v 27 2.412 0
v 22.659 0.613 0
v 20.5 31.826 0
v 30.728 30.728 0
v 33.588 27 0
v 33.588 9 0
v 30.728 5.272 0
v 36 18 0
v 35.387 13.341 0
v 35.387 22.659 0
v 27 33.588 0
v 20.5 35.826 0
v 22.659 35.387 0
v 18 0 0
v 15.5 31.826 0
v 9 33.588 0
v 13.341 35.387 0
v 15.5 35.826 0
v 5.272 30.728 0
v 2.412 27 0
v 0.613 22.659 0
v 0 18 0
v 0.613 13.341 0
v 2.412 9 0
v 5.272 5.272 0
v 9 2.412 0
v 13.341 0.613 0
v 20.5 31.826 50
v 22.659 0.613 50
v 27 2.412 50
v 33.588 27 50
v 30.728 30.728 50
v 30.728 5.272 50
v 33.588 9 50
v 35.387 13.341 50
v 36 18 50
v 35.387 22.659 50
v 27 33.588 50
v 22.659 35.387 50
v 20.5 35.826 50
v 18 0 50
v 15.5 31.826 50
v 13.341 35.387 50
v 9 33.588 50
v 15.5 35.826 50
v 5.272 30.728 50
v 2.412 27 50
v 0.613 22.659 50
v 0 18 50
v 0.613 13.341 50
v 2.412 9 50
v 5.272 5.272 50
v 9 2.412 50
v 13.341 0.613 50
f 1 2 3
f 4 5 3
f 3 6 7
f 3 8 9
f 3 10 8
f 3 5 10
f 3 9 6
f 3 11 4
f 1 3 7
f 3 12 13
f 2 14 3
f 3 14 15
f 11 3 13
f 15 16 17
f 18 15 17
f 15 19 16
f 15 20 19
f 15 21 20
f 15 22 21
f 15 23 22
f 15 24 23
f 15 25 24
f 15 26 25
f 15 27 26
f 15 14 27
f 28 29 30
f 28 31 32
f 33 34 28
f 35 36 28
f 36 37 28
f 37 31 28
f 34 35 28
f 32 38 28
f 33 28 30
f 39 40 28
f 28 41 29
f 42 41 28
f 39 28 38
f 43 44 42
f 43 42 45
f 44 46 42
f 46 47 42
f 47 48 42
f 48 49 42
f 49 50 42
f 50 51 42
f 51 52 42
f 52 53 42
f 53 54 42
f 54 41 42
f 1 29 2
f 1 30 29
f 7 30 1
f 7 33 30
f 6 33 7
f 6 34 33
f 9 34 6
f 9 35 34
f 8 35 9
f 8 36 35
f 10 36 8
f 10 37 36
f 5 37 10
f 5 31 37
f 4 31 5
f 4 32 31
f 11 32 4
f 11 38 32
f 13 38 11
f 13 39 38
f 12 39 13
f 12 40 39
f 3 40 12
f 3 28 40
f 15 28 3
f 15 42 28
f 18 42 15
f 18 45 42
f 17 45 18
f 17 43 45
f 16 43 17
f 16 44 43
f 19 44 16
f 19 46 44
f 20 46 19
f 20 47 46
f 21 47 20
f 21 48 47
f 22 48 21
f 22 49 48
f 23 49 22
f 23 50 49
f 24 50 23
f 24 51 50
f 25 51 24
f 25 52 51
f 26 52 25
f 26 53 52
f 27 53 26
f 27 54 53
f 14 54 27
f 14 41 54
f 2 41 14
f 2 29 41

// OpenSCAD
$fn = 32;

// ----------------------------------------------------------------------
// Keyway shaft: d36 shaft, key 5 x 4 mm
// ----------------------------------------------------------------------

// --- parameters (mm) ---
shaft_r = 18;             // shaft radius
key_w = 5;                // keyway width
key_d = 4;                // keyway depth below the surface line
plate_t = 50;             // shaft length, Z (extrusion height)

shaft_d = 2 * shaft_r;  // shaft diameter
circle_step = 15;  // polygon sampling step, degrees

profile = [[13.341, 35.387], [9, 33.588], [5.272, 30.728], [2.412, 27], [0.613, 22.659], [0, 18], [0.613, 13.341], [2.412, 9], [5.272, 5.272], [9, 2.412], [13.341, 0.613], [18, 0], [22.659, 0.613], [27, 2.412], [30.728, 5.272], [33.588, 9], [35.387, 13.341], [36, 18], [35.387, 22.659], [33.588, 27], [30.728, 30.728], [27, 33.588], [22.659, 35.387], [20.5, 35.826], [20.5, 31.826], [15.5, 31.826], [15.5, 35.826]];  // primary outline, 27 points, counter clockwise

// --- the one profile operation ---
linear_extrude(height = plate_t) polygon(points = profile);
